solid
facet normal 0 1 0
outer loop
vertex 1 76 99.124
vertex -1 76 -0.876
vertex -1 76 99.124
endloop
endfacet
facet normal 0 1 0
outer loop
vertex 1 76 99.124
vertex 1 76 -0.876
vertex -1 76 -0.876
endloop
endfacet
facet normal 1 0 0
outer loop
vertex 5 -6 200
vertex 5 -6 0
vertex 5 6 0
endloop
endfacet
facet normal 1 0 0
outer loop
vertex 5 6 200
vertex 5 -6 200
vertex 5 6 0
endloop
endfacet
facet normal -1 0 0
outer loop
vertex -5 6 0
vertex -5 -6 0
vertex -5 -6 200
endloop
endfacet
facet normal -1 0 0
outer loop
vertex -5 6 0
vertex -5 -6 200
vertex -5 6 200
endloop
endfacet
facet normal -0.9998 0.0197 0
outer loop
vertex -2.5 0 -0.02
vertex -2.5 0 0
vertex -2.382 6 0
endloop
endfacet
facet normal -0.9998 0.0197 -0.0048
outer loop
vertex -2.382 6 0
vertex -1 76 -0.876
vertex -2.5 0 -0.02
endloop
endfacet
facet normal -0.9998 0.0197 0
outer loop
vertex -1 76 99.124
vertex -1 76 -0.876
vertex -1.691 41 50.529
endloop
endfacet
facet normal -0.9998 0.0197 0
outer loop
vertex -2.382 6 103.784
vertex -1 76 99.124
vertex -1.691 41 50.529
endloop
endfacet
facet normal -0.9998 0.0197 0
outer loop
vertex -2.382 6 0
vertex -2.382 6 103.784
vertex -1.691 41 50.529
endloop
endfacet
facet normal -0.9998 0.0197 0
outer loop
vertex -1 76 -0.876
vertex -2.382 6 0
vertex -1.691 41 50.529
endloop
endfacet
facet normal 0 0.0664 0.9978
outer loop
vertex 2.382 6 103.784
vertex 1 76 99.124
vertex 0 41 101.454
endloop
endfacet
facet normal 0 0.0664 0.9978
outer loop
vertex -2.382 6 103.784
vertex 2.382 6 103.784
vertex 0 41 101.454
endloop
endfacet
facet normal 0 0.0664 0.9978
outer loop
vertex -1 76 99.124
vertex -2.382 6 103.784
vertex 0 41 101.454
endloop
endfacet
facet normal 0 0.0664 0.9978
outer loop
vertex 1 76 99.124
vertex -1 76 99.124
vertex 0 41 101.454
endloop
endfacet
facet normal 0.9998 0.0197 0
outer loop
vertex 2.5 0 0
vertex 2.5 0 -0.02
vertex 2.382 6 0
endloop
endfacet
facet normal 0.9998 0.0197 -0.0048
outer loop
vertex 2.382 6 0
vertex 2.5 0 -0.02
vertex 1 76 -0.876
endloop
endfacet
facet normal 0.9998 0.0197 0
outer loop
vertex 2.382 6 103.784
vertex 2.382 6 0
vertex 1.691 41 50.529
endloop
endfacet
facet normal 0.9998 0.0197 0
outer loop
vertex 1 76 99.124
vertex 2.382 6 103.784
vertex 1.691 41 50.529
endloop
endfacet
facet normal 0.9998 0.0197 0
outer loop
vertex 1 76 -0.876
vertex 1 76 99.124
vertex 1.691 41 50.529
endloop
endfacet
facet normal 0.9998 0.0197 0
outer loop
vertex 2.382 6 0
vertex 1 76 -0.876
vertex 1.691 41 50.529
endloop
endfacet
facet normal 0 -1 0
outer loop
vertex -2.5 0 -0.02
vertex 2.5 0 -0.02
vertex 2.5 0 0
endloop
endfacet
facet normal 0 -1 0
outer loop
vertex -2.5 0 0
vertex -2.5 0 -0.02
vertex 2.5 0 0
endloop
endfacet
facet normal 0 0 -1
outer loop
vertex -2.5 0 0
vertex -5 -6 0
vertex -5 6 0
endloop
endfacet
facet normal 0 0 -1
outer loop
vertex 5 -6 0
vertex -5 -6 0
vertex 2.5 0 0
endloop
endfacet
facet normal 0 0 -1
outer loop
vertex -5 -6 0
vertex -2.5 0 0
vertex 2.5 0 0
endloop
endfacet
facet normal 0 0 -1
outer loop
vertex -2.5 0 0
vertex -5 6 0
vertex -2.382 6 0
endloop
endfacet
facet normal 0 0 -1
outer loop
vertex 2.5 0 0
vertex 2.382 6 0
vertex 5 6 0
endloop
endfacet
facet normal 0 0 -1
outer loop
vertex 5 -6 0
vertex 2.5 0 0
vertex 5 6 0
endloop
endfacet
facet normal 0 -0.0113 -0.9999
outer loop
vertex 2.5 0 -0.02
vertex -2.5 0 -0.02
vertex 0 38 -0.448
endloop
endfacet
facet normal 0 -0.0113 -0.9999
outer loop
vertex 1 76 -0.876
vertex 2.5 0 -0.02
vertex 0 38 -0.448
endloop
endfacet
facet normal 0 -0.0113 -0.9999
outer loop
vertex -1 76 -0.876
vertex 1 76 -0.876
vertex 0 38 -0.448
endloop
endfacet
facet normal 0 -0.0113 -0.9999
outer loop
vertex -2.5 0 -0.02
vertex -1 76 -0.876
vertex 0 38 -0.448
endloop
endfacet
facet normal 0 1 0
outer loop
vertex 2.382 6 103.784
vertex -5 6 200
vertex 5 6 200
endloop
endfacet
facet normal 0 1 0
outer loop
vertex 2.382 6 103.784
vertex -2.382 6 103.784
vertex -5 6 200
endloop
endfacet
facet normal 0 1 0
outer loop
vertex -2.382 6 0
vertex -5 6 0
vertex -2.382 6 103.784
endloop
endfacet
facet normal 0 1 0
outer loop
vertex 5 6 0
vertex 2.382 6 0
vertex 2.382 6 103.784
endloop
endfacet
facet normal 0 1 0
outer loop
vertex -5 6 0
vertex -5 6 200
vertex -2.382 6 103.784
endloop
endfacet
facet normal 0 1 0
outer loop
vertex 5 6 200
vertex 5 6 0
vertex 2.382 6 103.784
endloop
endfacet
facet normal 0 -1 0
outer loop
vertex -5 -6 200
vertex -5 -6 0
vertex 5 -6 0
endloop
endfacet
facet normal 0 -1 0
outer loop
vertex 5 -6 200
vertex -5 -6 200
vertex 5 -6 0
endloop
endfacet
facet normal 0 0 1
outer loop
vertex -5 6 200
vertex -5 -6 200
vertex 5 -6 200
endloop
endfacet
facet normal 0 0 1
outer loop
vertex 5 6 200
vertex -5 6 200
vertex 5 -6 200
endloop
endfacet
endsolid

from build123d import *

# Parameters (mm, degrees)
ESQUISSE1_W        = 10
ESQUISSE1_H        = 12
BOSS_EXTRU_1_DEPTH = 200


with BuildPart() as part:
    # Esquisse1 → Boss.-Extru.1 (new body)
    with BuildSketch(Plane.XY):
        Rectangle(ESQUISSE1_W, ESQUISSE1_H)
    extrude(amount=BOSS_EXTRU_1_DEPTH)

    # Esquisse4 → Lissage2 section 0
    with BuildSketch(Plane(origin=(0, 0, 0), x_dir=(1, 0, 0), z_dir=(0, 1, 0))):
        with BuildLine():
            Line((-2.5, 0.020027966), (2.5, 0.020027966))
            Line((2.5, 0.020027966), (2.5, -104.18332506))
            Line((2.5, -104.18332506), (-2.5, -104.18332506))
            Line((-2.5, -104.18332506), (-2.5, 0.020027966))
        make_face()
    # Esquisse3 → Lissage2 section 1
    with BuildSketch(Plane(origin=(0, 76, 0), x_dir=(1, 0, 0), z_dir=(0, 1, 0))):
        with BuildLine():
            Line((-1, 0.876103951), (1, 0.876103951))
            Line((1, 0.876103951), (1, -99.123896049))
            Line((1, -99.123896049), (-1, -99.123896049))
            Line((-1, -99.123896049), (-1, 0.876103951))
        make_face()
    loft()


solid = part.part
